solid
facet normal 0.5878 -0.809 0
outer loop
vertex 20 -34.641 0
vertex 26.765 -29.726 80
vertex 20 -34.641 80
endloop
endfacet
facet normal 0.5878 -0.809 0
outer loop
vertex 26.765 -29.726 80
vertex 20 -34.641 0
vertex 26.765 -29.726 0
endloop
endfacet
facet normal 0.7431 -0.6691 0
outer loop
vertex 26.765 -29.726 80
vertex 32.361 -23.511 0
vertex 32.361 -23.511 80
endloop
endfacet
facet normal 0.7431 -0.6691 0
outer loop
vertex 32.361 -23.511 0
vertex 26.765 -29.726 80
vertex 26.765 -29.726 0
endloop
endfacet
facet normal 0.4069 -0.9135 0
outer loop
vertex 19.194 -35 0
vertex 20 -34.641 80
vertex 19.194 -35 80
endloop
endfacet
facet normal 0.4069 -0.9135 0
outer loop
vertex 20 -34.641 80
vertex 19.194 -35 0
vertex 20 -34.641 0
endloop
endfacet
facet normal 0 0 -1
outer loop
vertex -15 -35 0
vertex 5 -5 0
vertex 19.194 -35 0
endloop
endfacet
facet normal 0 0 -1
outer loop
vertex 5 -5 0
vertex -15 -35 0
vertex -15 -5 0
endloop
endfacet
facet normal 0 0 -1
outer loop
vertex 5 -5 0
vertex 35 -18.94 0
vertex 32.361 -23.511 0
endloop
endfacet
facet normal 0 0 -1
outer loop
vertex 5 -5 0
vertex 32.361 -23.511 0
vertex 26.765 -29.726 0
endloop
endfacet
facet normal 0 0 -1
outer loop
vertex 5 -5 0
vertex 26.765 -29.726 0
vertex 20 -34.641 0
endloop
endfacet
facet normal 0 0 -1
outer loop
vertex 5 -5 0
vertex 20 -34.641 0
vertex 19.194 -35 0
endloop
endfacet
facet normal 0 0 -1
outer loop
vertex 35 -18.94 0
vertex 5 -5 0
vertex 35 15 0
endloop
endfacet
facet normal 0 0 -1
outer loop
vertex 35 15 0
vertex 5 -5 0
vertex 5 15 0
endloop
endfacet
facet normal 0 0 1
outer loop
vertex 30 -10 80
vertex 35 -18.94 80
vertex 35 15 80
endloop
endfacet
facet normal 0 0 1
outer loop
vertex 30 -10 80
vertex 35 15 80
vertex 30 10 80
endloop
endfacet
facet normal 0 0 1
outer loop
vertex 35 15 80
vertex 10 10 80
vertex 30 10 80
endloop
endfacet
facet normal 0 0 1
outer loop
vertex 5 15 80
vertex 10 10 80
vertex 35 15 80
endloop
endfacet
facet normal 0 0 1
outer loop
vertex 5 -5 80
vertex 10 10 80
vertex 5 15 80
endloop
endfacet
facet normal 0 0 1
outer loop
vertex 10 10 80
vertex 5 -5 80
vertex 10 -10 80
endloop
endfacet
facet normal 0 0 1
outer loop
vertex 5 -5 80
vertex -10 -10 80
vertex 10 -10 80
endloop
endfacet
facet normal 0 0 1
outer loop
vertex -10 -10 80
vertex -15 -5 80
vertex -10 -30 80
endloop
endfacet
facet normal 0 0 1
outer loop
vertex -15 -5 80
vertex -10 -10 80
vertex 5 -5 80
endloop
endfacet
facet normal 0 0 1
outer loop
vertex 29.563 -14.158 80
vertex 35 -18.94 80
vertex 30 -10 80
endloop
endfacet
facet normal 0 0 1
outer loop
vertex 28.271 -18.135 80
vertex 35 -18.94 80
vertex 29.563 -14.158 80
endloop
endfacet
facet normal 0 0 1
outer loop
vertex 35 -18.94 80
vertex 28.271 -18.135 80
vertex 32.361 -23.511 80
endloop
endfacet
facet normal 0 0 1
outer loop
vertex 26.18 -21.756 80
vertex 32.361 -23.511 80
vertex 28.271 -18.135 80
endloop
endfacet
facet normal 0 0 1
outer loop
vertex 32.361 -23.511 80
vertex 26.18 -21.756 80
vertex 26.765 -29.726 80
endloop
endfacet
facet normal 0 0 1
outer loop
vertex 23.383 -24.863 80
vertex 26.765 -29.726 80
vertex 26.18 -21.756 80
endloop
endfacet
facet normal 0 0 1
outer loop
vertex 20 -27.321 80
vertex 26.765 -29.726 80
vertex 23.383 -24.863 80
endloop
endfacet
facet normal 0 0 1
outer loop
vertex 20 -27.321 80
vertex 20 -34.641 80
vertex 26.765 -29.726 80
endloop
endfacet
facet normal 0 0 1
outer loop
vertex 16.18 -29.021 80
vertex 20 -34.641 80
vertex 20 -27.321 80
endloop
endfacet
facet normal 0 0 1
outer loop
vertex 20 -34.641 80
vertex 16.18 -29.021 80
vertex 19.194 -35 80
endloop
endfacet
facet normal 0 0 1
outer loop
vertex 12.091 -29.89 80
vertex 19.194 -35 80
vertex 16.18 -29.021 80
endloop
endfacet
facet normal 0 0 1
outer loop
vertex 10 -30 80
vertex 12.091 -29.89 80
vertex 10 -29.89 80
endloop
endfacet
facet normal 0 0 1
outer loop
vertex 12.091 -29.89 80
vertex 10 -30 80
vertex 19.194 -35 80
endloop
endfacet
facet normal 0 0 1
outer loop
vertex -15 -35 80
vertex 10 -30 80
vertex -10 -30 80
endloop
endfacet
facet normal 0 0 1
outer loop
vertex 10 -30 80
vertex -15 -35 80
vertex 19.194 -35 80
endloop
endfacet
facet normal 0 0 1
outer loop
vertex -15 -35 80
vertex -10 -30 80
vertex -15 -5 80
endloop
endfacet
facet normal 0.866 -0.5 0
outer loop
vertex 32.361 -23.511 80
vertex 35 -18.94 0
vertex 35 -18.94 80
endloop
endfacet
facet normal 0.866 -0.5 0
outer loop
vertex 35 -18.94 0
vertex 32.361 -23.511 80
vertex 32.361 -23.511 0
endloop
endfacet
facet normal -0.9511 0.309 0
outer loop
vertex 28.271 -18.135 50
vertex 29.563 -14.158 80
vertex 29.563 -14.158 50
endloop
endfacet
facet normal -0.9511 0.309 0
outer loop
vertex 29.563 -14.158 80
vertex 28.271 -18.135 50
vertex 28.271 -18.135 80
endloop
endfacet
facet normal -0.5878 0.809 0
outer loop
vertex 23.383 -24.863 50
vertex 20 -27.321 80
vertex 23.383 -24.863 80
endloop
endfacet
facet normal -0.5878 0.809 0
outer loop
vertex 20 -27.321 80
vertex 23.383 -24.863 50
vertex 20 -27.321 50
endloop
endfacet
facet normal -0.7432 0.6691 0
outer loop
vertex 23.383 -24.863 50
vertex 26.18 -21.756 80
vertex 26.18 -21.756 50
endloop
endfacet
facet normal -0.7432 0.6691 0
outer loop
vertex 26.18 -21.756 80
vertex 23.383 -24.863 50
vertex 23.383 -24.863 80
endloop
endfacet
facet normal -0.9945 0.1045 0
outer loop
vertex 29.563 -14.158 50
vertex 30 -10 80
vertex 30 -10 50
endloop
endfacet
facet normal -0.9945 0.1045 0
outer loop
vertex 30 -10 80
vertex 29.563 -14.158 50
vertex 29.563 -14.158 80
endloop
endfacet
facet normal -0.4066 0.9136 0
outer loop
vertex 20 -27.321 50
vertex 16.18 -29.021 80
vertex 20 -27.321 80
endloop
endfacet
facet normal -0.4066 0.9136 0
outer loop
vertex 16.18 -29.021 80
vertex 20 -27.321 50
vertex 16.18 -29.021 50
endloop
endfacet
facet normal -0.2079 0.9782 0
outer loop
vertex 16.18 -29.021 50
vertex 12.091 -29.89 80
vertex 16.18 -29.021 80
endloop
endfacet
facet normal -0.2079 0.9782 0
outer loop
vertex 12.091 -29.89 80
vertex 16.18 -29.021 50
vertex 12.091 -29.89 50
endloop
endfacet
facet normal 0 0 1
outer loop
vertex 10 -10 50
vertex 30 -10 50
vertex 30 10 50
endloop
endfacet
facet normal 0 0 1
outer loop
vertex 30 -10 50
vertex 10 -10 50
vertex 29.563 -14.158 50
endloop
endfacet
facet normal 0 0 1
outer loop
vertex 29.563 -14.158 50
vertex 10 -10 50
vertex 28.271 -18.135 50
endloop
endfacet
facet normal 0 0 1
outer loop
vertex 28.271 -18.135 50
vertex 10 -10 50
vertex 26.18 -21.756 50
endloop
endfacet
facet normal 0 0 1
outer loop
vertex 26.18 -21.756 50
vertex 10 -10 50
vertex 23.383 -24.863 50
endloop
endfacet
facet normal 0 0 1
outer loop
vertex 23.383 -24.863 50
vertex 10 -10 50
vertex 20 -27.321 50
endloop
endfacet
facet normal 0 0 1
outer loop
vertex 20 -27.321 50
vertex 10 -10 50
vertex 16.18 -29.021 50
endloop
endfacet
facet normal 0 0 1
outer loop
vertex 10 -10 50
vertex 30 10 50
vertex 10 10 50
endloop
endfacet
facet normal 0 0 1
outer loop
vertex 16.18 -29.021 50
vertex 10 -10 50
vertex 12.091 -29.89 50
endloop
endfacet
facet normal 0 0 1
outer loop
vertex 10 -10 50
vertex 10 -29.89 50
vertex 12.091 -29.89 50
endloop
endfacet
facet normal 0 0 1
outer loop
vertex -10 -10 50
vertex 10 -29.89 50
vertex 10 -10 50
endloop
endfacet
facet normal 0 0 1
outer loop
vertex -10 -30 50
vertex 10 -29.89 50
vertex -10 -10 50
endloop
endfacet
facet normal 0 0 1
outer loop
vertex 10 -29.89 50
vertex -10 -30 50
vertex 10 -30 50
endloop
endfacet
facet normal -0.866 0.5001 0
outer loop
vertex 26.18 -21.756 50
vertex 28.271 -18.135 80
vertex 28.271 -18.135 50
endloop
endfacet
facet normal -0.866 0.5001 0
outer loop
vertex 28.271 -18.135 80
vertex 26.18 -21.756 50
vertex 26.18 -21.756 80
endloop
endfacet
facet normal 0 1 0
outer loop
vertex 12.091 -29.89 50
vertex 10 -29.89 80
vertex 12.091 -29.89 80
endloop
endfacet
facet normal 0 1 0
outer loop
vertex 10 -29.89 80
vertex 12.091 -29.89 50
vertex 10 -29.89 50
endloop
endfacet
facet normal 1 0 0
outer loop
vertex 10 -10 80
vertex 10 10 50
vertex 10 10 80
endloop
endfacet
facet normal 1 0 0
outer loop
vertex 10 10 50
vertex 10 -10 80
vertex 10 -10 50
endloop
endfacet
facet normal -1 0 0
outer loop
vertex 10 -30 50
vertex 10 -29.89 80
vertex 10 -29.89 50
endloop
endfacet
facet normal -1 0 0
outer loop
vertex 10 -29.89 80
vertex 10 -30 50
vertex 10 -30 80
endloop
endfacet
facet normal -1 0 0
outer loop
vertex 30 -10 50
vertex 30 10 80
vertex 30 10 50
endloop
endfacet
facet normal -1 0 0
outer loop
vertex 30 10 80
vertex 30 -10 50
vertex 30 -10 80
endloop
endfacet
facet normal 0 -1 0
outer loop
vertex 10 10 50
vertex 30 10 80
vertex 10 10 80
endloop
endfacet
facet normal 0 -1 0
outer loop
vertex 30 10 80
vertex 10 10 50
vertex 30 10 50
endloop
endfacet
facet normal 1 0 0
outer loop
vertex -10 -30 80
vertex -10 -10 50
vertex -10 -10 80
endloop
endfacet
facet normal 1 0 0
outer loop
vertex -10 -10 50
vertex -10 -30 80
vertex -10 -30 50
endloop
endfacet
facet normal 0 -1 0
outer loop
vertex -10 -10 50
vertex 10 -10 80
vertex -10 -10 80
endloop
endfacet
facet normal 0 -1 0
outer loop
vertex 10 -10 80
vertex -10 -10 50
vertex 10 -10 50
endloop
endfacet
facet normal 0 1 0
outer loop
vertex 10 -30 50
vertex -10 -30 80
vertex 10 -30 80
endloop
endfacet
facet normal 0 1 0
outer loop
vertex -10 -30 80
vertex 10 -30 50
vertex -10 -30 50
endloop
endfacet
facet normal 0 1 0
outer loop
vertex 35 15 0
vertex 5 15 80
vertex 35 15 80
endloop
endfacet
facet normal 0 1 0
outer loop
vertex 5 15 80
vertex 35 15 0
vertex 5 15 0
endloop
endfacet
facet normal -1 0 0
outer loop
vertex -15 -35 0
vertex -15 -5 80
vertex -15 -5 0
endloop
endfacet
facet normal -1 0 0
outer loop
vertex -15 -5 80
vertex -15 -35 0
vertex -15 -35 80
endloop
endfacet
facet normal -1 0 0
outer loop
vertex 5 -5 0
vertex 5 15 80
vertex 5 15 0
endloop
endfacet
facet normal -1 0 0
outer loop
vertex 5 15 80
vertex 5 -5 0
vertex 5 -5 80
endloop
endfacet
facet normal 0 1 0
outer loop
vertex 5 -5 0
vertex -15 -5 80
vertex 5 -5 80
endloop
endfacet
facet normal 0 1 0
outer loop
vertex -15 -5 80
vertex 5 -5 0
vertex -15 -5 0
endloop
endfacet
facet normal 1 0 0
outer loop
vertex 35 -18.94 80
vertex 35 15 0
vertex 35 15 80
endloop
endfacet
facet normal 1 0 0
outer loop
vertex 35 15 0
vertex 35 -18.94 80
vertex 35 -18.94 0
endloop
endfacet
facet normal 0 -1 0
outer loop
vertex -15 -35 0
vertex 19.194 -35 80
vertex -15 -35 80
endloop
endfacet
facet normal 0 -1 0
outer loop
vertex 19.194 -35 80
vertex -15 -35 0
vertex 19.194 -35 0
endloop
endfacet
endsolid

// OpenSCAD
difference() {
    union(){
        difference(){
            cylinder(r=40, h=80);
            translate([-42, -2, -1]) {
                cube([42, 42, 82]);
            }
        }

        cube([40, 40, 80]);

        translate([-40, -40, 0]) {
            cube([40, 40, 80]);
        }
    }
    translate([10, -10, 50]) {
        scale([0.5, 0.5, 0.5]) {
                union(){
                difference(){
                    cylinder(r=40, h=80);
                    translate([-42, -2, -1]) {
                        cube([42, 42, 82]);
                    }
                }

                cube([40, 40, 80]);

                translate([-40, -40, 0]) {
                    cube([40, 40, 80]);
                }
            }
        }
    }
    translate([0, 15, 0 ]) {
        cube([40, 40, 80]);
    }
    translate([-55, -40, 0 ]) {
        cube([40, 40, 80]);
    }
    translate([-40, -5, 0 ]) {
        cube([45, 45, 80]);
    }
    translate([35, -20, 0 ]) {
        cube([40, 40, 80]);
    }
    translate([-15, -75, 0]) {
        cube([40, 40, 80]);
    }
}
